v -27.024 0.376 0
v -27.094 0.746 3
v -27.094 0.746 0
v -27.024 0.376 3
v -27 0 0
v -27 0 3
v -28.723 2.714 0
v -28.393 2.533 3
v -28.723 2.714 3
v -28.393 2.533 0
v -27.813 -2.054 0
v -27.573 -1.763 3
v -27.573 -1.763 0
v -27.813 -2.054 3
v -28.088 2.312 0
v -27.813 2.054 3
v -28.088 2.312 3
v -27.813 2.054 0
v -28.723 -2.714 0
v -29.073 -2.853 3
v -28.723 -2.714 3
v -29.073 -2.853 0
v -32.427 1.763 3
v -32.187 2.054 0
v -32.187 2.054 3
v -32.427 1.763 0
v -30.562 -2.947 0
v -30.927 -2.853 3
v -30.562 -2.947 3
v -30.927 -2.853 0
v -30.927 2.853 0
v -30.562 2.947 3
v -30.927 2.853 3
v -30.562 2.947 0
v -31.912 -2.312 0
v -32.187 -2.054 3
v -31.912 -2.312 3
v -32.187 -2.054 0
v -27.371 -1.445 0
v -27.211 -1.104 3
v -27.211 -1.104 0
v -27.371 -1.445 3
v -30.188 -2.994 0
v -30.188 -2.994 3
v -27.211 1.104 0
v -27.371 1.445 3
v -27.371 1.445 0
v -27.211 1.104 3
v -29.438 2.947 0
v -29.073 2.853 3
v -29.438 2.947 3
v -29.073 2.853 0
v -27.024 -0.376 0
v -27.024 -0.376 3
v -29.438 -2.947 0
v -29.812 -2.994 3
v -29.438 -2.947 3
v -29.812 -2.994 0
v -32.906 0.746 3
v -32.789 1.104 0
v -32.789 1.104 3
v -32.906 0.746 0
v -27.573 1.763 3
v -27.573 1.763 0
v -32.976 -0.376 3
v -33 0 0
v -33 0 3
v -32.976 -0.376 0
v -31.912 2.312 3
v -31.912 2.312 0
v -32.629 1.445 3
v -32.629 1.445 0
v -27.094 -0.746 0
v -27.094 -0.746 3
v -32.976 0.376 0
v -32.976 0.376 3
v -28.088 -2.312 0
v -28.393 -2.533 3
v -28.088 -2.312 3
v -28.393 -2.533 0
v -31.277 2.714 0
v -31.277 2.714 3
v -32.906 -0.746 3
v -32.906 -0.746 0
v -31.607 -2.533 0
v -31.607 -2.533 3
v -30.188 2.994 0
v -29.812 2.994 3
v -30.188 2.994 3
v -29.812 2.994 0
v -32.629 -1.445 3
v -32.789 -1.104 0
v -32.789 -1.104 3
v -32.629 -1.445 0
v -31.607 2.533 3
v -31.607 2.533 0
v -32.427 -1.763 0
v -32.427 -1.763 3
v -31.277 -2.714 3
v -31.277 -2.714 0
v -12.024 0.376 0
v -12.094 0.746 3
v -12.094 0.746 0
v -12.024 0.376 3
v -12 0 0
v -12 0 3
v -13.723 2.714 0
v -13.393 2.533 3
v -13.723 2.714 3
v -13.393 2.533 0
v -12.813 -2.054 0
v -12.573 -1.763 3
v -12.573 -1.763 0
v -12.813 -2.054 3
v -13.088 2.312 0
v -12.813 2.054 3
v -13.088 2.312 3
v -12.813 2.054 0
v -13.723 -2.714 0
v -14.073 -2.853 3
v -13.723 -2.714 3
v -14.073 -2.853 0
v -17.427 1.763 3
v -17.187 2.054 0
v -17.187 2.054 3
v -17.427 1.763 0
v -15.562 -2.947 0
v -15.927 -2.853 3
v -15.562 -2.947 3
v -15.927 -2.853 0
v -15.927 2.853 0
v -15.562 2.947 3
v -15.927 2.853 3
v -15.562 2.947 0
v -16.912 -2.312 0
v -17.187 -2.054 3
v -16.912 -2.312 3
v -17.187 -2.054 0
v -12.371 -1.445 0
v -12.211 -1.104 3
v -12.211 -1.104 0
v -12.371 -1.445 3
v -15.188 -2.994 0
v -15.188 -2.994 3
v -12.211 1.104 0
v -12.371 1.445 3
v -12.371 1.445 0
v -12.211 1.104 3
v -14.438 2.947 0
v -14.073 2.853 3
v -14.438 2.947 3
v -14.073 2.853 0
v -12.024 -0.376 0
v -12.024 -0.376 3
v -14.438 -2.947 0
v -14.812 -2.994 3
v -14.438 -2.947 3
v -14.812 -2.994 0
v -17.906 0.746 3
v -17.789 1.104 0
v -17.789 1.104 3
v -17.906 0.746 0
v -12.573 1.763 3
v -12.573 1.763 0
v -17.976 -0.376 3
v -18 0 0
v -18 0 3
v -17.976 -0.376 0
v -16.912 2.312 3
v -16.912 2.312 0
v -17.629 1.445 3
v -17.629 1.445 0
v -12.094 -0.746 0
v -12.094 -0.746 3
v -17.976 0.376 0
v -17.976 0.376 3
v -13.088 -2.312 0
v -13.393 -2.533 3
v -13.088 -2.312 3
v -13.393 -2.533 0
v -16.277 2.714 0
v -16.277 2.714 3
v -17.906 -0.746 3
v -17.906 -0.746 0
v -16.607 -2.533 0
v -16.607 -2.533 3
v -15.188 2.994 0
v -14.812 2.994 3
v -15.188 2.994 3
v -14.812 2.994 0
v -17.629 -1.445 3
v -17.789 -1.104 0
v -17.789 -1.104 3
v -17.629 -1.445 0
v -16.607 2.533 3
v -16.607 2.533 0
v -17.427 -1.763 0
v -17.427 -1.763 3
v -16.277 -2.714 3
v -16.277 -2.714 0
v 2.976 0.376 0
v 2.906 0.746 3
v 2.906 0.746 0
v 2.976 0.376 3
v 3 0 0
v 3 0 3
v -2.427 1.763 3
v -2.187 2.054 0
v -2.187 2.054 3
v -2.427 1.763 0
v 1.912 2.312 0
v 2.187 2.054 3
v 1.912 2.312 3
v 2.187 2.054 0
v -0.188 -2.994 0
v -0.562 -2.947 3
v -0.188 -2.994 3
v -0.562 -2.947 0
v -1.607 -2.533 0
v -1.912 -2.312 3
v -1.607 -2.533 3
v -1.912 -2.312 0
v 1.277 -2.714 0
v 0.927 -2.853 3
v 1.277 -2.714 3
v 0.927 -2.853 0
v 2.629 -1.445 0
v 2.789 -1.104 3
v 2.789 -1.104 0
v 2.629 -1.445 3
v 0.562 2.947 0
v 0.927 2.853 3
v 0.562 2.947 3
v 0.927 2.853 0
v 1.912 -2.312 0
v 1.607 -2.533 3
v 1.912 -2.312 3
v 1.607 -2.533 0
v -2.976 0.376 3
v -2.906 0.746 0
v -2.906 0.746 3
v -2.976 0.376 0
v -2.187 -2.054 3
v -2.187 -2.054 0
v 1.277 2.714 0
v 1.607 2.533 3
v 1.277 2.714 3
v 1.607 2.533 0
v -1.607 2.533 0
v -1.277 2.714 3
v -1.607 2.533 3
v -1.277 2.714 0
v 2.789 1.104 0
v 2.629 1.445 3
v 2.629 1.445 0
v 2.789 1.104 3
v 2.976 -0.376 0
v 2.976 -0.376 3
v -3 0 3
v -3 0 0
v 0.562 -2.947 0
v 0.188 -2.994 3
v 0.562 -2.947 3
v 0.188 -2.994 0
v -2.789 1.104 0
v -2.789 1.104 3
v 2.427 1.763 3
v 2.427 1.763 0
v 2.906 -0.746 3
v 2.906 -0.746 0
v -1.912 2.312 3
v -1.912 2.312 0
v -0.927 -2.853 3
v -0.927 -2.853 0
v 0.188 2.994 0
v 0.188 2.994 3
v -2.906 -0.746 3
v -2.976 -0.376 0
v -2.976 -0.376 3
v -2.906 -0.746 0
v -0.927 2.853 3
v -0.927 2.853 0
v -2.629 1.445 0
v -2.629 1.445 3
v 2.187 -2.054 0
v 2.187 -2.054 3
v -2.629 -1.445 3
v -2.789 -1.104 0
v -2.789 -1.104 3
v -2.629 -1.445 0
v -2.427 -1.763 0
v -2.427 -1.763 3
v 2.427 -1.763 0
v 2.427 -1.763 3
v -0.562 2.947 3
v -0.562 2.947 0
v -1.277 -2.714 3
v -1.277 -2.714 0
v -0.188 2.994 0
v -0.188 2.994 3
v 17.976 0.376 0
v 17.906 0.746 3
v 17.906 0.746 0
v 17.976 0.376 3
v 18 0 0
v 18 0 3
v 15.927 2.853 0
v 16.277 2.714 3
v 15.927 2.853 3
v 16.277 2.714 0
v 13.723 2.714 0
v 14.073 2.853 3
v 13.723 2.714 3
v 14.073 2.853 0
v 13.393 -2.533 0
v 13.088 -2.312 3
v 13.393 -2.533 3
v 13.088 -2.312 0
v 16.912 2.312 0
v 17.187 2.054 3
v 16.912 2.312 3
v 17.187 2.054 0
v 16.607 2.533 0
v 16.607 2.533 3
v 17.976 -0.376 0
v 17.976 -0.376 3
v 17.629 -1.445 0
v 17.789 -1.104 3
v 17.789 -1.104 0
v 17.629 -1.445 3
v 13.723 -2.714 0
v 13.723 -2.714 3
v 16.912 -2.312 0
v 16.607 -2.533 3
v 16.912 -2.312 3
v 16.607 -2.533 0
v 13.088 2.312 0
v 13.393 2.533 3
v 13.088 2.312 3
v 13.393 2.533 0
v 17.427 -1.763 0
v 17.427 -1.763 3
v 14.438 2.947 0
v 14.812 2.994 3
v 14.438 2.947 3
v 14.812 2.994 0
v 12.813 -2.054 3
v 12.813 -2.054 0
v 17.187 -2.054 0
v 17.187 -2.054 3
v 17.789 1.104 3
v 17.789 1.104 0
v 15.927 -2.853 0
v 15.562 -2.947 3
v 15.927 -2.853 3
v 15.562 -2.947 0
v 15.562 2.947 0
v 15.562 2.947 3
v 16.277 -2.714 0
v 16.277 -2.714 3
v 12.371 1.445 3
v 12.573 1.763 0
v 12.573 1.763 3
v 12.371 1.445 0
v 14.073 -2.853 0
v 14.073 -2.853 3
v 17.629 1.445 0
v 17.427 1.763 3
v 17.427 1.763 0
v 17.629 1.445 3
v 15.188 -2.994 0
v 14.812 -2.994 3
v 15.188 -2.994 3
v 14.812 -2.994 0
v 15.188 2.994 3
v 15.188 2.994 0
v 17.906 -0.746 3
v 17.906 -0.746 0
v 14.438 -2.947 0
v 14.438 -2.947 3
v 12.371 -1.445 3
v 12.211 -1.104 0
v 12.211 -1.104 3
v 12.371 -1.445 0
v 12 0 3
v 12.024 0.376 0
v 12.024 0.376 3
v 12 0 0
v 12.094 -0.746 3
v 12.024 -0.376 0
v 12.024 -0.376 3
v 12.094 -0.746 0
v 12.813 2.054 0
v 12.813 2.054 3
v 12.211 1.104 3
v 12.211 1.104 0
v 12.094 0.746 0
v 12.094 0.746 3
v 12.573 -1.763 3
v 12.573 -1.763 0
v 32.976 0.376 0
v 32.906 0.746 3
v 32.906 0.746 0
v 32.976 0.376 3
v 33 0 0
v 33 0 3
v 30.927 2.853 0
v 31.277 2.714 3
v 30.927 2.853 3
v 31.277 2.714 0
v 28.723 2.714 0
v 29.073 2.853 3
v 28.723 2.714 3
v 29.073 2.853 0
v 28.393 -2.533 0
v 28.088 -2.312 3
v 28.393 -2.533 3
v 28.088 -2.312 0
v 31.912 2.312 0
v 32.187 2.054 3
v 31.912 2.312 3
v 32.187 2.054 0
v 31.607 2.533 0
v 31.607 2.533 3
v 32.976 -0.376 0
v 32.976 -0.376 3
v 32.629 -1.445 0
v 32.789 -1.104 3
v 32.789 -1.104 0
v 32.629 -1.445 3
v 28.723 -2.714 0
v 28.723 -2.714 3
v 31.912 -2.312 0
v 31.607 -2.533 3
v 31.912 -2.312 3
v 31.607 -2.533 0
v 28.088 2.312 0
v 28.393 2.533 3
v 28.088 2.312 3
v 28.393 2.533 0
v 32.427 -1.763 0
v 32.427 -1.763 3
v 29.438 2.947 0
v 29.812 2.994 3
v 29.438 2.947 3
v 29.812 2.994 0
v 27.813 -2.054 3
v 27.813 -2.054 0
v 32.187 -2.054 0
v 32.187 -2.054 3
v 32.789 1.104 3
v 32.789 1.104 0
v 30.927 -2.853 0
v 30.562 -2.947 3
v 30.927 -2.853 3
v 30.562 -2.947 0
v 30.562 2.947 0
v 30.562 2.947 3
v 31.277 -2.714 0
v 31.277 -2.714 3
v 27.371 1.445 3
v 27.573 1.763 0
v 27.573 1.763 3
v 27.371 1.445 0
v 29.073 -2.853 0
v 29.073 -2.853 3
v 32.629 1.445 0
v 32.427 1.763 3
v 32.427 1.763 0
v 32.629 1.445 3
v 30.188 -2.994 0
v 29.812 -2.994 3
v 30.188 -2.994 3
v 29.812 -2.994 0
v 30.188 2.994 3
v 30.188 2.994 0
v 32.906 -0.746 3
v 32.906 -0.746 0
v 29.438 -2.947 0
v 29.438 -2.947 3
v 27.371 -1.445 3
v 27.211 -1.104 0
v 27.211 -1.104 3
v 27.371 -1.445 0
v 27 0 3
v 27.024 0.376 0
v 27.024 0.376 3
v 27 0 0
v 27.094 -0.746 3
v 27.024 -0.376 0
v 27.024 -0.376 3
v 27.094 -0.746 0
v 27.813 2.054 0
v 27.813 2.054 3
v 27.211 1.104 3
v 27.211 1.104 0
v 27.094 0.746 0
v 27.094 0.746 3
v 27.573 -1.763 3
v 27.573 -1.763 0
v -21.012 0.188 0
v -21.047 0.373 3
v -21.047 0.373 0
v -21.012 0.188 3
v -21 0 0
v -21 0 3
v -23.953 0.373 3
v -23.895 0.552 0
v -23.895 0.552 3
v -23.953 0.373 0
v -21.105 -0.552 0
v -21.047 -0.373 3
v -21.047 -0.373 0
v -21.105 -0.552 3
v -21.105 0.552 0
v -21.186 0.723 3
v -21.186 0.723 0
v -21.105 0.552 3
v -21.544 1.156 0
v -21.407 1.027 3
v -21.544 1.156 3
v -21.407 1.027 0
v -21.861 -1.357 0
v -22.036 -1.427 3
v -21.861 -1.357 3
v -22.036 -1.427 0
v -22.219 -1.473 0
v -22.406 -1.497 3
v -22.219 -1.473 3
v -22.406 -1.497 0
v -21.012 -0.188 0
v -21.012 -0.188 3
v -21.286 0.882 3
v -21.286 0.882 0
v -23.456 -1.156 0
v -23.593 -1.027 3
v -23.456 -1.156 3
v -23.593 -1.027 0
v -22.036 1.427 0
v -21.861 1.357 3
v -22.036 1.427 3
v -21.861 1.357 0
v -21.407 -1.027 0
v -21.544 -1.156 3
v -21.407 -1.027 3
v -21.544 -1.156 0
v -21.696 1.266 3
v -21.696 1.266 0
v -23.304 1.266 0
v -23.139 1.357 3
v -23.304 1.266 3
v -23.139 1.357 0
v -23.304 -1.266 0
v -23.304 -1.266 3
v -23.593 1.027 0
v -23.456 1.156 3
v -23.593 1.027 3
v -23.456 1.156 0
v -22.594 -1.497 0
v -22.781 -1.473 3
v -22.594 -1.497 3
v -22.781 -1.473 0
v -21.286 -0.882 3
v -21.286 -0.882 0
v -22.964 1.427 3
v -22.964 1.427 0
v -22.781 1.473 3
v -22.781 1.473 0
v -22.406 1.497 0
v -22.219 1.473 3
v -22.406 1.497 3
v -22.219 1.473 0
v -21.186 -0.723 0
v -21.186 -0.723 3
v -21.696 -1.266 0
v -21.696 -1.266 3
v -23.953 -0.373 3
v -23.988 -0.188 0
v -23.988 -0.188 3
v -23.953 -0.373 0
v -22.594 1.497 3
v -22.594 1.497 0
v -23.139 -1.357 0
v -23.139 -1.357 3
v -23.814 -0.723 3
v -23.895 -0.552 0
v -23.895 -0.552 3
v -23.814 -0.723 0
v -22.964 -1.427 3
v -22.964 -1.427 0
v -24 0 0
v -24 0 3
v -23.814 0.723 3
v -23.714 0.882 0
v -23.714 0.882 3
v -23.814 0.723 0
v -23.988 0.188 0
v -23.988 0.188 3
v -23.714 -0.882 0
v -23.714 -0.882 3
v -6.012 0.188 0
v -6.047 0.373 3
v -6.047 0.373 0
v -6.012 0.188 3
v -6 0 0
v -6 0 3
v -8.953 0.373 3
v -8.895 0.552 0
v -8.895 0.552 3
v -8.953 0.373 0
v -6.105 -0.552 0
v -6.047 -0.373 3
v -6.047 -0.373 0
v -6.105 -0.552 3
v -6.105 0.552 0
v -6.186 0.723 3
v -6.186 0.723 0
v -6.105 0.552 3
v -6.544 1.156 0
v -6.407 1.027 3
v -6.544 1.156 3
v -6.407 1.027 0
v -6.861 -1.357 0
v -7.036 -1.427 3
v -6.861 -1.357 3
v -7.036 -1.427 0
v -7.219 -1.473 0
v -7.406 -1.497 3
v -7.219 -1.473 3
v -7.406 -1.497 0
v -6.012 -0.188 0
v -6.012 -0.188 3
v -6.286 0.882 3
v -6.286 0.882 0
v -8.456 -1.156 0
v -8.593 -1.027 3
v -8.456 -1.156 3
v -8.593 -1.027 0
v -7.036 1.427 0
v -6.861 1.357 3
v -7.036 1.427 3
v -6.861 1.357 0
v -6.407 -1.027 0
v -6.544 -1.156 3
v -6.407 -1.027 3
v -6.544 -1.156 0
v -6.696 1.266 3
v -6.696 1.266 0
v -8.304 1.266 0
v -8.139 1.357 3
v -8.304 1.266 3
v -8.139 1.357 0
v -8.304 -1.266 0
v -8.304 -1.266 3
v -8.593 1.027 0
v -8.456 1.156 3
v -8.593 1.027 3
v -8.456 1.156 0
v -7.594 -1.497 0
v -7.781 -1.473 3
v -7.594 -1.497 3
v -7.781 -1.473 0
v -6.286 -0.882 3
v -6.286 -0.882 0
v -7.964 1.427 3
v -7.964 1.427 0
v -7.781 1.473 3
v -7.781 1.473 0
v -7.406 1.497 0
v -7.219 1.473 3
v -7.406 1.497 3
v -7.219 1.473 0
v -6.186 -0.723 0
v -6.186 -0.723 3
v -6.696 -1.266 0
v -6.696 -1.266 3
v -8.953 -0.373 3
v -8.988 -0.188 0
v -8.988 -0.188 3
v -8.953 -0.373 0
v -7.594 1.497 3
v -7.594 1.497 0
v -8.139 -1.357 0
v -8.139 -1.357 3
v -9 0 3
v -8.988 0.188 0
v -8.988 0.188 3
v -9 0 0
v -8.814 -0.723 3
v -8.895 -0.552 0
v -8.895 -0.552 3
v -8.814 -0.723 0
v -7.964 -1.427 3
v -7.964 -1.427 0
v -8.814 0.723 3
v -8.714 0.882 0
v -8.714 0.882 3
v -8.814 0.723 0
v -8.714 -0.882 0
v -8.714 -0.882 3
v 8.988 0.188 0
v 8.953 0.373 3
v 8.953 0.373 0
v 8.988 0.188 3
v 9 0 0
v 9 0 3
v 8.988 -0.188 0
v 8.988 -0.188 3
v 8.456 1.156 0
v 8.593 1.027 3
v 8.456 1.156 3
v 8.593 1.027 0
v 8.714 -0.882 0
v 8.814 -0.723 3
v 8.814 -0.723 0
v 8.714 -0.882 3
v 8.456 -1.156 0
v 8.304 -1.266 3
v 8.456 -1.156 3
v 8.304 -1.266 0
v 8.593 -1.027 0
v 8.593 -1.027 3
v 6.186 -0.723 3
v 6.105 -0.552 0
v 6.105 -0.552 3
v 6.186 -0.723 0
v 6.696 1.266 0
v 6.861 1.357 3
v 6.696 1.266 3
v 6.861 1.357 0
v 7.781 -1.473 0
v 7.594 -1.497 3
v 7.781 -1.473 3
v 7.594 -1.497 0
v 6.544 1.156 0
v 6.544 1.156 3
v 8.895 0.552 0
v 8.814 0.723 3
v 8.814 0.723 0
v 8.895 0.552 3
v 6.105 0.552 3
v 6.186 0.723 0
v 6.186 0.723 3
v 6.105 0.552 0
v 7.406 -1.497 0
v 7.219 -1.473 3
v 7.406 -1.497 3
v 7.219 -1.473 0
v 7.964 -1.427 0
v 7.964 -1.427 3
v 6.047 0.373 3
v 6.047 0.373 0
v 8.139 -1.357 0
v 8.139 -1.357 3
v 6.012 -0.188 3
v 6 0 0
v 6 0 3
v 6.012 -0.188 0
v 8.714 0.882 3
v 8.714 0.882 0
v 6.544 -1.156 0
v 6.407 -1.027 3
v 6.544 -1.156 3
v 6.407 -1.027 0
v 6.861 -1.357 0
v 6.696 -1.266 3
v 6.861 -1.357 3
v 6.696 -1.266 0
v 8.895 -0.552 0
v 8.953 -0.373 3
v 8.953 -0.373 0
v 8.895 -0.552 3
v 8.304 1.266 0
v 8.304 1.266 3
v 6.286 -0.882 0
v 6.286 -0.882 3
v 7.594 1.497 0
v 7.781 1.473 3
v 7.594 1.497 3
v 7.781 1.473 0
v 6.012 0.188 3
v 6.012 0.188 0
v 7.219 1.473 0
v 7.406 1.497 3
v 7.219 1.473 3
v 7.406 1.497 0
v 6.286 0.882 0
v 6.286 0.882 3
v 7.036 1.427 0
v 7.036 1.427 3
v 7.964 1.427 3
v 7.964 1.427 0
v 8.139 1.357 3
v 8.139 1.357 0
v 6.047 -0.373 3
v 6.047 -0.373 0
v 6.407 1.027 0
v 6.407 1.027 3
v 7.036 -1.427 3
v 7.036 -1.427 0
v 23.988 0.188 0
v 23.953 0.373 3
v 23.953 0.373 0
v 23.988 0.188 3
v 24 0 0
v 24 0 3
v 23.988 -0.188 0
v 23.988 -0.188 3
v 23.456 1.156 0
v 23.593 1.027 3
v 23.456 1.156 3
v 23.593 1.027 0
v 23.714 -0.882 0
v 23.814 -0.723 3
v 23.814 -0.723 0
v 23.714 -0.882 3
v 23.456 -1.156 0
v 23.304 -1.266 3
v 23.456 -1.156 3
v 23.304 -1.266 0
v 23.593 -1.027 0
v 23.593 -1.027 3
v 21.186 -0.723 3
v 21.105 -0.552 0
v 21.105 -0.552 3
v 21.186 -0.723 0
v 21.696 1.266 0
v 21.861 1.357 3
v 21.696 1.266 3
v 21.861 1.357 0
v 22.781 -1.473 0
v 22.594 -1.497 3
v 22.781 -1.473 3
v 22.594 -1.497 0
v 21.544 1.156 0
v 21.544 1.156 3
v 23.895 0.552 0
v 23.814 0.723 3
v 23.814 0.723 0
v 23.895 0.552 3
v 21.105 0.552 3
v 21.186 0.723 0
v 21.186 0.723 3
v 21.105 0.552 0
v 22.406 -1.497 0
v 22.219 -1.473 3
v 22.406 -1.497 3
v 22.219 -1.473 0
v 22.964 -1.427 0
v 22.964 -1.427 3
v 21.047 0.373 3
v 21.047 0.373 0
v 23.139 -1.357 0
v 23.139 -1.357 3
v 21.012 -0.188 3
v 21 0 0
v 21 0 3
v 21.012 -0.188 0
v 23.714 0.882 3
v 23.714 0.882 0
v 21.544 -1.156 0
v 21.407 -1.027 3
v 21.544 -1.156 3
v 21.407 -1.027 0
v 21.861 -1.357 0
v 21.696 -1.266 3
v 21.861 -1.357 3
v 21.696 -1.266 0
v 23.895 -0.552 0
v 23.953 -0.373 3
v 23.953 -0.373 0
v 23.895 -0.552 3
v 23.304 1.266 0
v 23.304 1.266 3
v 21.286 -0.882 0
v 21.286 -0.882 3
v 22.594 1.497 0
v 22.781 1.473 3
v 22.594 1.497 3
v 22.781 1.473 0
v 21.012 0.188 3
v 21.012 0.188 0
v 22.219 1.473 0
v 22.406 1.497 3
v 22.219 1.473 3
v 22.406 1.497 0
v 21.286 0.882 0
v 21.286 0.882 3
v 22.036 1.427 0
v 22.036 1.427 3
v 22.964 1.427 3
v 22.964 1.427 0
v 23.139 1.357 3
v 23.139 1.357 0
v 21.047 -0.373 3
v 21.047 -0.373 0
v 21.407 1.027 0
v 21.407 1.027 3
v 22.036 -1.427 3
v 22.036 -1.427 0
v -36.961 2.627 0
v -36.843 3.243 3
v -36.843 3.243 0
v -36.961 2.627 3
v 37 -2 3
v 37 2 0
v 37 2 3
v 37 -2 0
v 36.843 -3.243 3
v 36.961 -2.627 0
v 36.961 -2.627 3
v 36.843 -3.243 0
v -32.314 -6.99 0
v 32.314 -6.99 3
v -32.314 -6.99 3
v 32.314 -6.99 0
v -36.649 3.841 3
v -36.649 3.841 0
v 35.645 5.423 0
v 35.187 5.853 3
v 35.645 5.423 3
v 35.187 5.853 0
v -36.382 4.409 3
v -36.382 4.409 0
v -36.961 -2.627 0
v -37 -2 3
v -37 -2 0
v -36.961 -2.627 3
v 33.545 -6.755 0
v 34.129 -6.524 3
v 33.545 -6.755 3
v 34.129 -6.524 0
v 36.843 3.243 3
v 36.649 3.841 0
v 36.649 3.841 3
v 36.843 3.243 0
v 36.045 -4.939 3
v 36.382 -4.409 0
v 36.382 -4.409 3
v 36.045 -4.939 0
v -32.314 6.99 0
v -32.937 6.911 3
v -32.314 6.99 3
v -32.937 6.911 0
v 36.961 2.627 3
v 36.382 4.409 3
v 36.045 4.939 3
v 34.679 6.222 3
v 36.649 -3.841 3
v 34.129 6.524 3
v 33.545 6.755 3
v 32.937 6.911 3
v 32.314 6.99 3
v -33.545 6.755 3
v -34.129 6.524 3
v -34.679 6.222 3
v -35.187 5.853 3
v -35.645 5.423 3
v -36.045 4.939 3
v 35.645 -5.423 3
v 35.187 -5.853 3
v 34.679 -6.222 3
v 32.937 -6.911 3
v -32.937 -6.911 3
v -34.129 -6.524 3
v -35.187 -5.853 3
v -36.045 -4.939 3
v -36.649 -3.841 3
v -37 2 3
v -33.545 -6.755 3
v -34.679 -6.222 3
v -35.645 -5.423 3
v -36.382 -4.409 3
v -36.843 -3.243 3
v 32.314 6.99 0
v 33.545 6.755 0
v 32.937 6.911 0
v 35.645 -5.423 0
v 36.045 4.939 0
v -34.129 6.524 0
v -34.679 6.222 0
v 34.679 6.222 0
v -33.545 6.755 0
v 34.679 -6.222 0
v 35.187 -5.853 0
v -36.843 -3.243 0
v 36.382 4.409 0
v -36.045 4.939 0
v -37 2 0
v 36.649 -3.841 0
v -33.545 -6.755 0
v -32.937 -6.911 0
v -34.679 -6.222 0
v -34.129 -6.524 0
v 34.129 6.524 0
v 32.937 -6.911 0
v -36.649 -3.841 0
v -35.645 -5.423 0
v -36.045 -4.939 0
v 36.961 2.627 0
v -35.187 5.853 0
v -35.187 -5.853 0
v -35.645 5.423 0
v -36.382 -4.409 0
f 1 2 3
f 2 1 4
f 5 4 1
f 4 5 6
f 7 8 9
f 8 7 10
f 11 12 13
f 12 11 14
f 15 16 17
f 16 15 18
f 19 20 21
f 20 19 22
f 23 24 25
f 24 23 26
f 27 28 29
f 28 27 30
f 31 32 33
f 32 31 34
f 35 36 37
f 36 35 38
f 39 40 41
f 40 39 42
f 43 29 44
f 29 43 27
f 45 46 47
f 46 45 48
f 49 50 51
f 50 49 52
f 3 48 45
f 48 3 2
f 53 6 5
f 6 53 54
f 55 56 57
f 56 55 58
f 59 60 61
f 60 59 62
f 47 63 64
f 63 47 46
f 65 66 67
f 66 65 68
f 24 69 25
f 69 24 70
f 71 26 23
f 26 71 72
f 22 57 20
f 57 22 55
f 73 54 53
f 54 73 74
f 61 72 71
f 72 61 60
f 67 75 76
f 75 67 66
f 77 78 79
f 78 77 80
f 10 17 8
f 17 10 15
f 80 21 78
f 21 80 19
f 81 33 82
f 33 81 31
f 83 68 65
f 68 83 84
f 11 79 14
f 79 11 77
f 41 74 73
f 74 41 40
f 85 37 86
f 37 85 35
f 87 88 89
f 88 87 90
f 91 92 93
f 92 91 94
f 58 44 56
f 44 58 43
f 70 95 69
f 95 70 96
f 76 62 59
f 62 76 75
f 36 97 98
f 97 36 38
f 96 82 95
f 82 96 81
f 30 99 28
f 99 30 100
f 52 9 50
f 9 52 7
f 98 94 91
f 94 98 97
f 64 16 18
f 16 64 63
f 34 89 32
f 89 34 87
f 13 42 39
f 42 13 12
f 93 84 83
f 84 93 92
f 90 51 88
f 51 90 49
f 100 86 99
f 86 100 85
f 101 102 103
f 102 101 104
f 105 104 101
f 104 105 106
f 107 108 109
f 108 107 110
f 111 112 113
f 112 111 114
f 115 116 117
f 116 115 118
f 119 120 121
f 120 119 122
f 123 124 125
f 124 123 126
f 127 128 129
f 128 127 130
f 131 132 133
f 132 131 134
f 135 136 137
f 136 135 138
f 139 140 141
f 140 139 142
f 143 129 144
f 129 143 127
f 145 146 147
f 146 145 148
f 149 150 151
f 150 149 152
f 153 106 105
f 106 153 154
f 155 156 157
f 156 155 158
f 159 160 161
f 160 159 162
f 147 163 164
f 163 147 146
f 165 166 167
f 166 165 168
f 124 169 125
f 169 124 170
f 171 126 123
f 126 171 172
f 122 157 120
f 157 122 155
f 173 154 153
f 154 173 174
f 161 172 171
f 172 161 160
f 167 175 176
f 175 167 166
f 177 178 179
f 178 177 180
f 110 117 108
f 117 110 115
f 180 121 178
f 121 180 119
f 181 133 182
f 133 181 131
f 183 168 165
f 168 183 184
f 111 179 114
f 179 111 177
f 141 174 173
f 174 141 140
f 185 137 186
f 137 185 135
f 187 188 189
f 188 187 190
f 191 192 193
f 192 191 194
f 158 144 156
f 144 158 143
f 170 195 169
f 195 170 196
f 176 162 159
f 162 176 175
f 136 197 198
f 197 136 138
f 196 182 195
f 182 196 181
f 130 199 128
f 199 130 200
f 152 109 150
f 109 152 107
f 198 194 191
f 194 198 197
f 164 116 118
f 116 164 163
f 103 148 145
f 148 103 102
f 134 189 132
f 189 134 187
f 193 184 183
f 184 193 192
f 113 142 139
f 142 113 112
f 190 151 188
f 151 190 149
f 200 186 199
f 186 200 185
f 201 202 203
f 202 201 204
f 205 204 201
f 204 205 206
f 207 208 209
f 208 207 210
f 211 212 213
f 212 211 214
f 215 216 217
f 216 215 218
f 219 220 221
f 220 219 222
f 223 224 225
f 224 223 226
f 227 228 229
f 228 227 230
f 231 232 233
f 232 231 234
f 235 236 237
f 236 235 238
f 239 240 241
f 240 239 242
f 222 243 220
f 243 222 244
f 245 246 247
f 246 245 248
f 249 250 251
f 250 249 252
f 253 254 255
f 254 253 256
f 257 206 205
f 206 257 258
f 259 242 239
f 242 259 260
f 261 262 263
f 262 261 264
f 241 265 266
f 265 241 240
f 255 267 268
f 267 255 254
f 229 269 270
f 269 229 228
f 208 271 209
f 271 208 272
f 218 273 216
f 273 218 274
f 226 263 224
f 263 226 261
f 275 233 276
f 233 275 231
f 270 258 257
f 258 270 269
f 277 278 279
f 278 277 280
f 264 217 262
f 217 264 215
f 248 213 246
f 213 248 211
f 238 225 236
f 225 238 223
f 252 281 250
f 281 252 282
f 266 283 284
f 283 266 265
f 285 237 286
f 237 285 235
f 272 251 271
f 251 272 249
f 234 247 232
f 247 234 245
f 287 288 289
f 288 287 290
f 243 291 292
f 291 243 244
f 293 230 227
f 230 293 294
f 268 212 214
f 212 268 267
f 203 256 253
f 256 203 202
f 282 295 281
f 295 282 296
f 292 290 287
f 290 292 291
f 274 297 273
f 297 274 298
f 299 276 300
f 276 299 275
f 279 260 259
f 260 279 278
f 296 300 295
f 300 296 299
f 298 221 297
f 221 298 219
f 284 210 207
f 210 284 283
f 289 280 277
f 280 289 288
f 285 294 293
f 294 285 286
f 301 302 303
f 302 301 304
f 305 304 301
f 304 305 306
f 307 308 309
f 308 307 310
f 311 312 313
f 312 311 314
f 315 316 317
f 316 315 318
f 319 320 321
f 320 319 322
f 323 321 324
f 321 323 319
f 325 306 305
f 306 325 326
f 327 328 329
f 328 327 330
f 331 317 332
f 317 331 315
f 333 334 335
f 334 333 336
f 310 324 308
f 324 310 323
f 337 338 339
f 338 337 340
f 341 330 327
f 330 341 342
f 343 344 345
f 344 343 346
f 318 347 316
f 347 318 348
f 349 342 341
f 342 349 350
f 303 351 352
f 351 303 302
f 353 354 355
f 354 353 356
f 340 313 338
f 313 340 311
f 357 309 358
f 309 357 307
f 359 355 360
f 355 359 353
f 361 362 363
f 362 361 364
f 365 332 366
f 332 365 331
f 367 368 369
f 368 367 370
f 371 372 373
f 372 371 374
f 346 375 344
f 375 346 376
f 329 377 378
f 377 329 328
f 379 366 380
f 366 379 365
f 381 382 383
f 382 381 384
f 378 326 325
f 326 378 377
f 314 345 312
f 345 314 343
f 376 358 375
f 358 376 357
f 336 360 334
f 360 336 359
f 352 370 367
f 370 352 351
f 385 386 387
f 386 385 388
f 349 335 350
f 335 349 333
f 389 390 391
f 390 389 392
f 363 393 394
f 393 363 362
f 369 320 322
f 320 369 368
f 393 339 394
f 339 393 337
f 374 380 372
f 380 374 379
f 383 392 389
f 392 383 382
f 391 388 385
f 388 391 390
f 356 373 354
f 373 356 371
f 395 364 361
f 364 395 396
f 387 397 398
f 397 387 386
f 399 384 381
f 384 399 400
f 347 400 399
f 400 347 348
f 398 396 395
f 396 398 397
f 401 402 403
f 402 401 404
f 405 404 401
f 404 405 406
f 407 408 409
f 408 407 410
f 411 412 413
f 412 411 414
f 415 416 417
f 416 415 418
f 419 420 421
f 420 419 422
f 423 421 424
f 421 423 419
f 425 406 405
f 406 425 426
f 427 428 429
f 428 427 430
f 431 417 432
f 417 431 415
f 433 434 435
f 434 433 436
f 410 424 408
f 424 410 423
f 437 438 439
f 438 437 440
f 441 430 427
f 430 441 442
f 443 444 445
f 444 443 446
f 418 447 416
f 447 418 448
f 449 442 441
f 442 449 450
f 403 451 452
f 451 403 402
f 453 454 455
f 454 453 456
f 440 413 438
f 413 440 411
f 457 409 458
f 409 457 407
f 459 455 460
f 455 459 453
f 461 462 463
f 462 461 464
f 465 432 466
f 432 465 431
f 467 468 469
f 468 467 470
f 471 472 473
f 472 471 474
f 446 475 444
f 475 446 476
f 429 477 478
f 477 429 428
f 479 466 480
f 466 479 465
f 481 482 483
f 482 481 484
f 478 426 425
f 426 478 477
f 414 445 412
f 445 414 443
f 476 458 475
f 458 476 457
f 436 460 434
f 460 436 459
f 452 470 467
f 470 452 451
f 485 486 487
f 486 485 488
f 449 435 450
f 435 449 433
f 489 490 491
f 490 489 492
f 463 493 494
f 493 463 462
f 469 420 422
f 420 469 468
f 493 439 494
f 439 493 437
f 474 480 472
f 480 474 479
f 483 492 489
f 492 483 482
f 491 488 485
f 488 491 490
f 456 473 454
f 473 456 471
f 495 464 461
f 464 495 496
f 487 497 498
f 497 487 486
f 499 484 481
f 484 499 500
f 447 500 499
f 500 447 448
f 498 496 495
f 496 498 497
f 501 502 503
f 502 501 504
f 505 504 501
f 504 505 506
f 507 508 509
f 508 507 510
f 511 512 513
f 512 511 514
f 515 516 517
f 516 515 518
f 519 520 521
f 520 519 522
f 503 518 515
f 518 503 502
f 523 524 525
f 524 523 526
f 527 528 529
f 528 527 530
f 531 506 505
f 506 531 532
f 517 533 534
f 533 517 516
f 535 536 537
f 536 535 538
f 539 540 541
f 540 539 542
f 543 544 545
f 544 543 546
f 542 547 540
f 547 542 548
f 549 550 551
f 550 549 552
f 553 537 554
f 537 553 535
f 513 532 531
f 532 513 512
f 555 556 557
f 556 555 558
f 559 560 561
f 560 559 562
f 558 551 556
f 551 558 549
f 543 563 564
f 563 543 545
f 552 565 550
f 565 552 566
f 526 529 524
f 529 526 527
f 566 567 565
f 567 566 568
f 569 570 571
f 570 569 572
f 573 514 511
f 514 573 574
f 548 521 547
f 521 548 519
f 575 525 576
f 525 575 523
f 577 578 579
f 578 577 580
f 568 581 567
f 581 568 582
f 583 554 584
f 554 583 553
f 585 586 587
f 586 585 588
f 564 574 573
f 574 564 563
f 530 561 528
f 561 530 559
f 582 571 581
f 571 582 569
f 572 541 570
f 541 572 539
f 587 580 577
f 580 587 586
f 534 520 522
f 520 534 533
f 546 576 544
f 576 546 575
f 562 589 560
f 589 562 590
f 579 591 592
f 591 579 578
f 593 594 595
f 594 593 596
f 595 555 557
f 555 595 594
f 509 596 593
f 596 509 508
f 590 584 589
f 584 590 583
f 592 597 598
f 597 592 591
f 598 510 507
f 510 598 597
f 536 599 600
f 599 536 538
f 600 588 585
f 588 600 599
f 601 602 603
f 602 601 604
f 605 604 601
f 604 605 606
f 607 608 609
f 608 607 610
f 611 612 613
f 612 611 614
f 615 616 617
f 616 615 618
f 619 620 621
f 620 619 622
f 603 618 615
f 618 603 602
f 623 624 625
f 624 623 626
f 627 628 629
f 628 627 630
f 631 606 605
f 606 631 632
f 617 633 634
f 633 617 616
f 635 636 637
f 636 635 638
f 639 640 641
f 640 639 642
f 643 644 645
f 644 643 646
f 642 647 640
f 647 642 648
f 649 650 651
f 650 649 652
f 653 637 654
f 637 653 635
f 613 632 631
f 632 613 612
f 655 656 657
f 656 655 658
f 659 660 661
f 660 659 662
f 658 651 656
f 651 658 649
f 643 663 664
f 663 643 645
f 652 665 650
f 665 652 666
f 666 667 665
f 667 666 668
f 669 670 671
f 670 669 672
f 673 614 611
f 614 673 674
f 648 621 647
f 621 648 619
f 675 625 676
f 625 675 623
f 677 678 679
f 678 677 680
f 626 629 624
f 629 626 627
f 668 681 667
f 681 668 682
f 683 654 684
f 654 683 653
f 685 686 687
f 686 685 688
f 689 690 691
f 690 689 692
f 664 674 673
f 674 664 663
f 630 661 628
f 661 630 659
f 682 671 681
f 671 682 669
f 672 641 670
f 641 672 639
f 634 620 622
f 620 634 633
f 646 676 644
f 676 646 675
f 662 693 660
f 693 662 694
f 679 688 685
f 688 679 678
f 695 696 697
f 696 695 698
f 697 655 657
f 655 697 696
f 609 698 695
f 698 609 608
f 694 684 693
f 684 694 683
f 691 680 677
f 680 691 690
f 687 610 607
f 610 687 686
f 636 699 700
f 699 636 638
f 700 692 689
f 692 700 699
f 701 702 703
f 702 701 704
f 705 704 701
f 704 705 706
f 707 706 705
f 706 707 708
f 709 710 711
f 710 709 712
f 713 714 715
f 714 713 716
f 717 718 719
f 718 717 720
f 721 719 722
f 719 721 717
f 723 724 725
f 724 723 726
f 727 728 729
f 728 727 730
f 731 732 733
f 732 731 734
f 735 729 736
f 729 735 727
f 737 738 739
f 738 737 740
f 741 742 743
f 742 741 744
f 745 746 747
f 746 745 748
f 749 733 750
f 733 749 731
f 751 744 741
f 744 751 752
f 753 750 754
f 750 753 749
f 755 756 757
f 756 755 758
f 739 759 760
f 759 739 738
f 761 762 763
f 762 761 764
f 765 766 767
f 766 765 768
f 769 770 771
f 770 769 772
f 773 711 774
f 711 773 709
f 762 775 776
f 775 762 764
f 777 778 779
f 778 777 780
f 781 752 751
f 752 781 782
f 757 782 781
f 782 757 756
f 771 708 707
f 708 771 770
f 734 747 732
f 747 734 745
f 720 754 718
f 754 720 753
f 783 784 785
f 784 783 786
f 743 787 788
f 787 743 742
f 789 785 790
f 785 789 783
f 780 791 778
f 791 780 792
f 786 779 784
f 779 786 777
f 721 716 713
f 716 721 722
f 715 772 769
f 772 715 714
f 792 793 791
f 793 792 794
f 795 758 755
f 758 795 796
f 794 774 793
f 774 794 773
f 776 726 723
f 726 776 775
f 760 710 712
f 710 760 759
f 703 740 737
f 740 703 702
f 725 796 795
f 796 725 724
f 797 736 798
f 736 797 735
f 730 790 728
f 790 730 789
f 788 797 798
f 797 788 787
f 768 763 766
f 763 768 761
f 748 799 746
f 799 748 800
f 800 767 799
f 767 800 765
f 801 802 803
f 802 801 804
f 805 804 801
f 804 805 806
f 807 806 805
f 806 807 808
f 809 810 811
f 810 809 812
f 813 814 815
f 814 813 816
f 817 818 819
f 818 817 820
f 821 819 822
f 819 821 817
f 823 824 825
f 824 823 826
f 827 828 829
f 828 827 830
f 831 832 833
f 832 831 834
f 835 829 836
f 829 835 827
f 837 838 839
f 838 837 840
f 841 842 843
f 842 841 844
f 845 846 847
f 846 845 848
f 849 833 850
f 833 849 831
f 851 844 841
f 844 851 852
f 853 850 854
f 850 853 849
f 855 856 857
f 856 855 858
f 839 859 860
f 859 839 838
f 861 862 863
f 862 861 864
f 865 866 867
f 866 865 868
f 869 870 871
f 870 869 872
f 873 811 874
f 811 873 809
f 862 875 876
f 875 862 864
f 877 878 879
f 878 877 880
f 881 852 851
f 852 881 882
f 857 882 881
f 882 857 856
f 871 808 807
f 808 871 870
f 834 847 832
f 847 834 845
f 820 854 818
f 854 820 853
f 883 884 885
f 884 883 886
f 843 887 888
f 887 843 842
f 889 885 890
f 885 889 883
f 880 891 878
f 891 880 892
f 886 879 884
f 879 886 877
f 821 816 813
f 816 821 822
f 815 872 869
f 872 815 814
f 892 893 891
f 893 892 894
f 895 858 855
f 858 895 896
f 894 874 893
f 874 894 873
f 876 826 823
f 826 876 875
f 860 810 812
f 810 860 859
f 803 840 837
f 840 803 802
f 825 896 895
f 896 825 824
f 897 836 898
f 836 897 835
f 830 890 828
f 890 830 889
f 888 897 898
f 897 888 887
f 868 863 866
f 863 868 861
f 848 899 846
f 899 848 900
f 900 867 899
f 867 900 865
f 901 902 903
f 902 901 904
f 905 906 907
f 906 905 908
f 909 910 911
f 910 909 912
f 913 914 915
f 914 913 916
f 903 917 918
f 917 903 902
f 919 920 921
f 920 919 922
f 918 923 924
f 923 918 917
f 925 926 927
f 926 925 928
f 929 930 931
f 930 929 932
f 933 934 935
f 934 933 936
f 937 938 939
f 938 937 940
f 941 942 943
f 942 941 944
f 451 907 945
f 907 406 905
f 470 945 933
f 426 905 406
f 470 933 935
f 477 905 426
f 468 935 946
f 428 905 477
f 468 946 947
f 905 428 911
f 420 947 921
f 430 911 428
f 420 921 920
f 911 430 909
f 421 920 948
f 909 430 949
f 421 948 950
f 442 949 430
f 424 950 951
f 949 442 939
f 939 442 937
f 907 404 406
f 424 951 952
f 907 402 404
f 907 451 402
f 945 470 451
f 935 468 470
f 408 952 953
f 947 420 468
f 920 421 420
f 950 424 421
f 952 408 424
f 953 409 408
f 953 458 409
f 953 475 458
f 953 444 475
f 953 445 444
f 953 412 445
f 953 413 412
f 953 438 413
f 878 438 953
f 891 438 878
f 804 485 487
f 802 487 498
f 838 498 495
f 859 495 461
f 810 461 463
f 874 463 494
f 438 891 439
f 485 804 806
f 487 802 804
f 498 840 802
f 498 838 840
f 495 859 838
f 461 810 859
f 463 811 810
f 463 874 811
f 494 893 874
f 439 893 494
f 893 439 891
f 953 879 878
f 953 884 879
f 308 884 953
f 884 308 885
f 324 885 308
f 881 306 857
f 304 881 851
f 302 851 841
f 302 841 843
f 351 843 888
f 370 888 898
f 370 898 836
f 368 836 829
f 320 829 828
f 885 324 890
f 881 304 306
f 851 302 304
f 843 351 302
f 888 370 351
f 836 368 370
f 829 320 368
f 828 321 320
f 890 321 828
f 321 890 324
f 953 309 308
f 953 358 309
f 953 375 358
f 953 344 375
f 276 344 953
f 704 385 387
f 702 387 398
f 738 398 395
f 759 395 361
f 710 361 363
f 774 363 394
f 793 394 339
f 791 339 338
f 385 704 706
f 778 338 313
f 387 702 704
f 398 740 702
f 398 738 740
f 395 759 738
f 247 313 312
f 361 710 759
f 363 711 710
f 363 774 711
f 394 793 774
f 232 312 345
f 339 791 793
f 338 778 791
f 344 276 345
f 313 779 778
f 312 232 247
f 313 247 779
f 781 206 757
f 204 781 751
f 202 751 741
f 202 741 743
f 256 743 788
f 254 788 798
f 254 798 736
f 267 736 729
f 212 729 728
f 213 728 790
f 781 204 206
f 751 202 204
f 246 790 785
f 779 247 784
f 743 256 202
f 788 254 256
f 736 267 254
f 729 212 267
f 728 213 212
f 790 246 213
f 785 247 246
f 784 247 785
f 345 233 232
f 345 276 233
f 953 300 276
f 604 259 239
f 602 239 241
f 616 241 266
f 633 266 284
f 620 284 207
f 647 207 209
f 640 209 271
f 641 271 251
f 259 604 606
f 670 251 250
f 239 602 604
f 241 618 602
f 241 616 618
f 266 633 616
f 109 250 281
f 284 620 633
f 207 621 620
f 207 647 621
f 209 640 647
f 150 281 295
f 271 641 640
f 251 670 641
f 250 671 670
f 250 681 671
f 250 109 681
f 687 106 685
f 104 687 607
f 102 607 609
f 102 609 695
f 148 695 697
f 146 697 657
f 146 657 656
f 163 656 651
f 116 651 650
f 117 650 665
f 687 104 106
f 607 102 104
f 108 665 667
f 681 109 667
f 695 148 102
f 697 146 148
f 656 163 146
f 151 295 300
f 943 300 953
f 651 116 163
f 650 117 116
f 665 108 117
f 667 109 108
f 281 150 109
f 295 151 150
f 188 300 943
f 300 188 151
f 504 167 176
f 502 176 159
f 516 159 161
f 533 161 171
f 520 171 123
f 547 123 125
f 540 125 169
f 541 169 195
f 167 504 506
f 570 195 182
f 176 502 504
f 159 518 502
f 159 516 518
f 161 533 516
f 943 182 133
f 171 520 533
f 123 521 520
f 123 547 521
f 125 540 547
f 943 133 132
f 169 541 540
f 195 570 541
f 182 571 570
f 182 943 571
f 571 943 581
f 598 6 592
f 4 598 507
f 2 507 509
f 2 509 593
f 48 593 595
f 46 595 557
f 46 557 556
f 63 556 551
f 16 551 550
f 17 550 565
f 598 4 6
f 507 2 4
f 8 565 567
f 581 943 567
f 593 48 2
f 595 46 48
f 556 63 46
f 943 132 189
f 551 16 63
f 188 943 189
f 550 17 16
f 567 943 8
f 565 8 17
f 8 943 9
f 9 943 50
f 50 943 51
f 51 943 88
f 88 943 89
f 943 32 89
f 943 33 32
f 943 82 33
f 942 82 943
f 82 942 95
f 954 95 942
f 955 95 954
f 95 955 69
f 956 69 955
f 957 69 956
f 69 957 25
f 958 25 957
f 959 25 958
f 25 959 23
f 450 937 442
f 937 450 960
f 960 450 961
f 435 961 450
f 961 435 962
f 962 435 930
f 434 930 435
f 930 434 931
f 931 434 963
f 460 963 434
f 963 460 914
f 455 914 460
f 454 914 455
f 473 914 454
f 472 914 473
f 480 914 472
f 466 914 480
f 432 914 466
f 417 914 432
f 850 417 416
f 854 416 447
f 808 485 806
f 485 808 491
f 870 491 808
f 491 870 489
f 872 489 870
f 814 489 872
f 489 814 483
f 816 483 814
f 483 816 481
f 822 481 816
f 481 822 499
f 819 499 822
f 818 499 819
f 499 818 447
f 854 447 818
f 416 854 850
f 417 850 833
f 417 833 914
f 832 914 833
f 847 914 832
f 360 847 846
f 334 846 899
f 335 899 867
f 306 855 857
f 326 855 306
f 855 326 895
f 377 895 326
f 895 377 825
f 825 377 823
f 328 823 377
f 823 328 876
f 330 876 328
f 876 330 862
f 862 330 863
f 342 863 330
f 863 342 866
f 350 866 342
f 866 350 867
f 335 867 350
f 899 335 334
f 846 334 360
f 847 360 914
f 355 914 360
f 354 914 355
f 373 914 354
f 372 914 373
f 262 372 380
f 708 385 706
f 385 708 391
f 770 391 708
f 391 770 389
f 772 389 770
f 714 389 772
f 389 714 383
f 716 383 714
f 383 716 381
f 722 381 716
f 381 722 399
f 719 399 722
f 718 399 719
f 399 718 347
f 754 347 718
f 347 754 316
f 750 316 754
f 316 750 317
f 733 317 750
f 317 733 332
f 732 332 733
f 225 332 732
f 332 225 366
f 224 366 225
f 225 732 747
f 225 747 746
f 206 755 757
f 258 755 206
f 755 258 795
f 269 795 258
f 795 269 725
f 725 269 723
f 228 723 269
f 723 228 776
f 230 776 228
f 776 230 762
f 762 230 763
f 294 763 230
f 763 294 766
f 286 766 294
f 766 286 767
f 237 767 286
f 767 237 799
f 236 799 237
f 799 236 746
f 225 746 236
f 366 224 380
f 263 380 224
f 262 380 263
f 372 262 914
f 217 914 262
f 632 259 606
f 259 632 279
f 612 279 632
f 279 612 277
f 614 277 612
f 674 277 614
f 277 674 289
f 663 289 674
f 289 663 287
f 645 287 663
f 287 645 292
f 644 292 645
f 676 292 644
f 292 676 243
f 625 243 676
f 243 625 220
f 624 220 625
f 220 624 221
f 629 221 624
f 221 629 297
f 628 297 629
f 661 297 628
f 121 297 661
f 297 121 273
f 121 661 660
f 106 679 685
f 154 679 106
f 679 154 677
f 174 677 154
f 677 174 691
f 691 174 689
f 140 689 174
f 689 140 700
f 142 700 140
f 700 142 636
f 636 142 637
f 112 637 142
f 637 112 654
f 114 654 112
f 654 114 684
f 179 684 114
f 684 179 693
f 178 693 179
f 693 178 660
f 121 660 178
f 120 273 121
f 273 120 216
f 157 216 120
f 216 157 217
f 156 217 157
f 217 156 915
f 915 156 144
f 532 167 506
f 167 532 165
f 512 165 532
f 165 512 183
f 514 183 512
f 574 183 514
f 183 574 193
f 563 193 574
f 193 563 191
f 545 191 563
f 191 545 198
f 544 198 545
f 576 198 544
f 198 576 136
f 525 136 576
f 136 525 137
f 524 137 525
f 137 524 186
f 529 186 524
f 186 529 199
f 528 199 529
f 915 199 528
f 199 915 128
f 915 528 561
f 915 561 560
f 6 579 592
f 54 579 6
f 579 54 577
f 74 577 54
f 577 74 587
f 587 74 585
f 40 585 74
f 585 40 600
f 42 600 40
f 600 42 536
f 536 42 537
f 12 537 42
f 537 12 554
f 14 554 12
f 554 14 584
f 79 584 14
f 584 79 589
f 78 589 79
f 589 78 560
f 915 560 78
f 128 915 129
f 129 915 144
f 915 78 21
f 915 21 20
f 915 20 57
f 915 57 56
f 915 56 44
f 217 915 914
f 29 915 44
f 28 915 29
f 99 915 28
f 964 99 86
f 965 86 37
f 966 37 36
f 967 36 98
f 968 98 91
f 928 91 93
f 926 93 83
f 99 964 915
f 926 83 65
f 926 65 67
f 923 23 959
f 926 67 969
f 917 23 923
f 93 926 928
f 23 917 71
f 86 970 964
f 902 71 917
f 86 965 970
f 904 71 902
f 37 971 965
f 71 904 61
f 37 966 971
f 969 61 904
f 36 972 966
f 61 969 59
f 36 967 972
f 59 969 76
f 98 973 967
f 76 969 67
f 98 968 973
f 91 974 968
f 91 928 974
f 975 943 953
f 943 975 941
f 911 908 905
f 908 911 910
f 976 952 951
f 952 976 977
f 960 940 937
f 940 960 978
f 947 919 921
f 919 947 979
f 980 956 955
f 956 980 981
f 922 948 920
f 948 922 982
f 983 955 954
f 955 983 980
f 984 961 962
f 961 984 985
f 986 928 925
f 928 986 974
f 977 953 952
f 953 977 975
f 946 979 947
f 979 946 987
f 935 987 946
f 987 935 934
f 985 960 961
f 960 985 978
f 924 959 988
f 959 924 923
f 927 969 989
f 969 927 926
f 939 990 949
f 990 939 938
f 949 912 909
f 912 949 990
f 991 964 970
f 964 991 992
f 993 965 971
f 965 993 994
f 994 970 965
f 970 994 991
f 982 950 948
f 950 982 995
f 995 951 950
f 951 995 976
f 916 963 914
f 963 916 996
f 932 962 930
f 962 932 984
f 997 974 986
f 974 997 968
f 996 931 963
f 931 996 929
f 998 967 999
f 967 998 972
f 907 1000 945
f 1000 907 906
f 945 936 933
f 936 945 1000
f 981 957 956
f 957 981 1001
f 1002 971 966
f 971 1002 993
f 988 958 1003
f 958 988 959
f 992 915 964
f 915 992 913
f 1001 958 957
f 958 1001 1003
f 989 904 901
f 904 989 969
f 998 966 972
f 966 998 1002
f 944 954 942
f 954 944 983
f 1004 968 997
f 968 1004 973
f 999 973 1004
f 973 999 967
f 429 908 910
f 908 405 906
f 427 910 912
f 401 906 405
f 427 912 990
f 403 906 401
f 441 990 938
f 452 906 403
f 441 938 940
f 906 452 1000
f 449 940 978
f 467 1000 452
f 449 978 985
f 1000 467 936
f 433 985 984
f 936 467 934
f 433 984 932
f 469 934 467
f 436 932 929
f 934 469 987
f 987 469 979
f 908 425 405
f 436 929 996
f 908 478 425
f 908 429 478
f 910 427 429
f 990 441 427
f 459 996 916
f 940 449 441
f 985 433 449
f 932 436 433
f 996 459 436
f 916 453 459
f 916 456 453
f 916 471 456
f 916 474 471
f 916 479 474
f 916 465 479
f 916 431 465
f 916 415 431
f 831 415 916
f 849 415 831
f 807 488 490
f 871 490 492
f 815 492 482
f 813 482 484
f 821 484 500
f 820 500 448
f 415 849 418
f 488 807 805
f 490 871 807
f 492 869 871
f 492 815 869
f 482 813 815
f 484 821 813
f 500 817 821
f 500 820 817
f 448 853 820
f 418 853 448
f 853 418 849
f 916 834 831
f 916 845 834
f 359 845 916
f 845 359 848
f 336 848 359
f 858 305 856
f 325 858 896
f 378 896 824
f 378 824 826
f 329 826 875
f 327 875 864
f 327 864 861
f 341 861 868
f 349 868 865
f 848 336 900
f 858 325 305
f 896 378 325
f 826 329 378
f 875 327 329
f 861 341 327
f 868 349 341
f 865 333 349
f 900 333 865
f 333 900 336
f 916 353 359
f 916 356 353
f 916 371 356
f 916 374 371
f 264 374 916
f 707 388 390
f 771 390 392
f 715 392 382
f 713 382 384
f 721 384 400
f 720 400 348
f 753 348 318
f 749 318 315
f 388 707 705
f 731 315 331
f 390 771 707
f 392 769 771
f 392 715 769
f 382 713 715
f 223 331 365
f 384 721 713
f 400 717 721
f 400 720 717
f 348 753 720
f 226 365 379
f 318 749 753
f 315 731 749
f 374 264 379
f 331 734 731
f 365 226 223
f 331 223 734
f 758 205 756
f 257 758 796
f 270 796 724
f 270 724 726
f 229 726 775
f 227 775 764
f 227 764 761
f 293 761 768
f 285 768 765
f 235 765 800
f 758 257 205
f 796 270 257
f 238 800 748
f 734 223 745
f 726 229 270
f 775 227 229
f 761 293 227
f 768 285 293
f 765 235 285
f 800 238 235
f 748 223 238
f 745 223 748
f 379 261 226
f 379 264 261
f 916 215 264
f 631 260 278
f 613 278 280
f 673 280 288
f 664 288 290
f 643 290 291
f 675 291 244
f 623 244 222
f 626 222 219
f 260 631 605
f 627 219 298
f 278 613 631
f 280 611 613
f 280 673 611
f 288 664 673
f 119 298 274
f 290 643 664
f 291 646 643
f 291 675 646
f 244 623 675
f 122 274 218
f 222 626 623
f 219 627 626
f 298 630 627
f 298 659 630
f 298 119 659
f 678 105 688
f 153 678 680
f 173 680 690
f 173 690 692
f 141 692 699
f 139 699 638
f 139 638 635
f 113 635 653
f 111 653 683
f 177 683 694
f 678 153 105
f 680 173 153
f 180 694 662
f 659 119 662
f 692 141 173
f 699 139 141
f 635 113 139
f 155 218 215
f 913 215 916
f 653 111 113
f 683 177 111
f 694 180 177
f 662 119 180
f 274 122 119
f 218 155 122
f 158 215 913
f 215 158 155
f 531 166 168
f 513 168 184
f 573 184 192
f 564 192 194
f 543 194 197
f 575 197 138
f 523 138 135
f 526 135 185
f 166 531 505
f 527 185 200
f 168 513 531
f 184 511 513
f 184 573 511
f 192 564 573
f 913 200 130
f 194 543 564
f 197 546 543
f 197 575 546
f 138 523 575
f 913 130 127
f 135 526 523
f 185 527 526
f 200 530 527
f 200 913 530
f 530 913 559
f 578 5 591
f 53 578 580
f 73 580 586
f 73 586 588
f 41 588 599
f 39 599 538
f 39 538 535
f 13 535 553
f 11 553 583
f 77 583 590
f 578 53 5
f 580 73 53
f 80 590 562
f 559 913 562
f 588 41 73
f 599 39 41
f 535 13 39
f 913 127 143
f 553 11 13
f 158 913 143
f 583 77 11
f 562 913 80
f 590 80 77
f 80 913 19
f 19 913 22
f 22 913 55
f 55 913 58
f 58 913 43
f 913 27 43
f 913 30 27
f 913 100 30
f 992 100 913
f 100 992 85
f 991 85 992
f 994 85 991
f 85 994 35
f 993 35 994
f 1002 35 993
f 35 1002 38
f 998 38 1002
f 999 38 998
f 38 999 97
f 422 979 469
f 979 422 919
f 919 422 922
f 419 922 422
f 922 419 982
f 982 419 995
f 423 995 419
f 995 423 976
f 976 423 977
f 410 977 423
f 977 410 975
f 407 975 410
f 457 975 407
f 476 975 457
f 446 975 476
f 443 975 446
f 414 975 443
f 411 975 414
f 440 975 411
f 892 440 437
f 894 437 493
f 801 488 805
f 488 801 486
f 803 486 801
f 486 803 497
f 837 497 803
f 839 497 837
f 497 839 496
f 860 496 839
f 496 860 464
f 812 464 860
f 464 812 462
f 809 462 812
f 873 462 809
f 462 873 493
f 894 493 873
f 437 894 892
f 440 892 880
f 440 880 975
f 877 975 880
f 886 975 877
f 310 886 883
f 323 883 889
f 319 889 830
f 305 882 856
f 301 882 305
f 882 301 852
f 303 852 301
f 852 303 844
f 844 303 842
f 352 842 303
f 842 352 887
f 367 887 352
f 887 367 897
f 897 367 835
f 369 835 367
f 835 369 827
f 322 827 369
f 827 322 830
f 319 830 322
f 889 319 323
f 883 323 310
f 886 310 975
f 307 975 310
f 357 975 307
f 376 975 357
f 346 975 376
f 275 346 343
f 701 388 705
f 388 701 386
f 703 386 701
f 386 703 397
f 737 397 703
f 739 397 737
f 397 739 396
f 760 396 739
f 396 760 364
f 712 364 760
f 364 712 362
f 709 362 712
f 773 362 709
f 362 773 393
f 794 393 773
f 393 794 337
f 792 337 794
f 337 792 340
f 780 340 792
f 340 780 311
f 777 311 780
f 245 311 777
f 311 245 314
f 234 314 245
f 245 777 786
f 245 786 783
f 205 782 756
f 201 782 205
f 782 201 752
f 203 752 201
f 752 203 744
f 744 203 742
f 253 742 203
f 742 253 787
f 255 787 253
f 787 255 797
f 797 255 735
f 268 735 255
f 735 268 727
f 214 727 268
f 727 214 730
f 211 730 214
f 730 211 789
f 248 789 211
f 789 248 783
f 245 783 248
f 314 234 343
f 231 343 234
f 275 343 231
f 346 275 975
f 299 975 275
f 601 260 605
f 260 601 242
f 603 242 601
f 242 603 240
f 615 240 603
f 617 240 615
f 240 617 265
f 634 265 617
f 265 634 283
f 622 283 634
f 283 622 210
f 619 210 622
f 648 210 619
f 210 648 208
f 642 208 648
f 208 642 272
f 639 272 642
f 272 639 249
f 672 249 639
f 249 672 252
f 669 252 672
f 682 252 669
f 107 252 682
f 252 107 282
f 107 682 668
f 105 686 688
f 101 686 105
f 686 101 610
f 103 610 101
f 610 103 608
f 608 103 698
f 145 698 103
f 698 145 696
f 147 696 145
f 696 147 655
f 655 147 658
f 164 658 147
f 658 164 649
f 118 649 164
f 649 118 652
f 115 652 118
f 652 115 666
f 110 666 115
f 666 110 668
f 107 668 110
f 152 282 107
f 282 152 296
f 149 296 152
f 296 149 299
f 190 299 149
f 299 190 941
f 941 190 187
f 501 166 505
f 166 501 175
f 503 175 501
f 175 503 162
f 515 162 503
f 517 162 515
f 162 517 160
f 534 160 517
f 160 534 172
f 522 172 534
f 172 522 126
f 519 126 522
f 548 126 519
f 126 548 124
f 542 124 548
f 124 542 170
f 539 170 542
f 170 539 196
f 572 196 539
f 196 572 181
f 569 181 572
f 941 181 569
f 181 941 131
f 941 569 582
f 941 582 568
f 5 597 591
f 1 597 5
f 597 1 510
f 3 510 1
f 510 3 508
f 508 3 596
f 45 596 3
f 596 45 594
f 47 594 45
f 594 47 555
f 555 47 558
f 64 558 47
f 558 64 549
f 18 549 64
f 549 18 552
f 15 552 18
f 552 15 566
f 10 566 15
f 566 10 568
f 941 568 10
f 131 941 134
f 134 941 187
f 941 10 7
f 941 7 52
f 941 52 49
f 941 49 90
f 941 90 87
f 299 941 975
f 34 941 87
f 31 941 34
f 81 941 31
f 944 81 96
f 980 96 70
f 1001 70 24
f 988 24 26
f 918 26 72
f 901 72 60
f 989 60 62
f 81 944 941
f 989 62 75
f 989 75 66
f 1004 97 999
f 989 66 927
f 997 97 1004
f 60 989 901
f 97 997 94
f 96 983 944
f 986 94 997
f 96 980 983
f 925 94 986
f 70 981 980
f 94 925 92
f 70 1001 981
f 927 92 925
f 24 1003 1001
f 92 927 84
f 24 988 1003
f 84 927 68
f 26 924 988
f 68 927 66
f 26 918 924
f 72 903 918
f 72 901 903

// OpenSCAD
$fn = 50;


difference() {
	union() {
		*color(alpha = 1.0000000000, c = "gray") {
			translate(v = [0, 7, 0]) {
				linear_extrude(height = 1) {
					text(font = "Arial:style=Bold", halign = "center", size = 4.5000000000, text = "COMMENT plate main", valign = "center");
				}
			}
		}
		hull() {
			translate(v = [-32.0000000000, 2.0000000000, 0]) {
				cylinder(h = 3, r = 5);
			}
			translate(v = [32.0000000000, 2.0000000000, 0]) {
				cylinder(h = 3, r = 5);
			}
			translate(v = [-32.0000000000, -2.0000000000, 0]) {
				cylinder(h = 3, r = 5);
			}
			translate(v = [32.0000000000, -2.0000000000, 0]) {
				cylinder(h = 3, r = 5);
			}
		}
	}
	union() {
		*color(alpha = 1.0000000000, c = "gray") {
			translate(v = [0, 7, 0]) {
				linear_extrude(height = 1) {
					text(font = "Arial:style=Bold", halign = "center", size = 4.5000000000, text = "COMMENT holes main", valign = "center");
				}
			}
		}
		translate(v = [-30.0000000000, 0.0000000000, 0]) {
			translate(v = [0, 0, -100]) {
				cylinder(h = 200, r = 3.0000000000);
			}
		}
		translate(v = [-15.0000000000, 0.0000000000, 0]) {
			translate(v = [0, 0, -100]) {
				cylinder(h = 200, r = 3.0000000000);
			}
		}
		translate(v = [0, 0, -100]) {
			cylinder(h = 200, r = 3.0000000000);
		}
		translate(v = [15.0000000000, 0.0000000000, 0]) {
			translate(v = [0, 0, -100]) {
				cylinder(h = 200, r = 3.0000000000);
			}
		}
		translate(v = [30.0000000000, 0.0000000000, 0]) {
			translate(v = [0, 0, -100]) {
				cylinder(h = 200, r = 3.0000000000);
			}
		}
		translate(v = [-30.0000000000, 0.0000000000, 0]) {
			translate(v = [0, 0, -100]) {
				cylinder(h = 200, r = 1.5000000000);
			}
		}
		translate(v = [-22.5000000000, 0.0000000000, 0]) {
			translate(v = [0, 0, -100]) {
				cylinder(h = 200, r = 1.5000000000);
			}
		}
		translate(v = [-15.0000000000, 0.0000000000, 0]) {
			translate(v = [0, 0, -100]) {
				cylinder(h = 200, r = 1.5000000000);
			}
		}
		translate(v = [-7.5000000000, 0.0000000000, 0]) {
			translate(v = [0, 0, -100]) {
				cylinder(h = 200, r = 1.5000000000);
			}
		}
		translate(v = [0, 0, -100]) {
			cylinder(h = 200, r = 1.5000000000);
		}
		translate(v = [7.5000000000, 0.0000000000, 0]) {
			translate(v = [0, 0, -100]) {
				cylinder(h = 200, r = 1.5000000000);
			}
		}
		translate(v = [15.0000000000, 0.0000000000, 0]) {
			translate(v = [0, 0, -100]) {
				cylinder(h = 200, r = 1.5000000000);
			}
		}
		translate(v = [22.5000000000, 0.0000000000, 0]) {
			translate(v = [0, 0, -100]) {
				cylinder(h = 200, r = 1.5000000000);
			}
		}
		translate(v = [30.0000000000, 0.0000000000, 0]) {
			translate(v = [0, 0, -100]) {
				cylinder(h = 200, r = 1.5000000000);
			}
		}
	}
}
